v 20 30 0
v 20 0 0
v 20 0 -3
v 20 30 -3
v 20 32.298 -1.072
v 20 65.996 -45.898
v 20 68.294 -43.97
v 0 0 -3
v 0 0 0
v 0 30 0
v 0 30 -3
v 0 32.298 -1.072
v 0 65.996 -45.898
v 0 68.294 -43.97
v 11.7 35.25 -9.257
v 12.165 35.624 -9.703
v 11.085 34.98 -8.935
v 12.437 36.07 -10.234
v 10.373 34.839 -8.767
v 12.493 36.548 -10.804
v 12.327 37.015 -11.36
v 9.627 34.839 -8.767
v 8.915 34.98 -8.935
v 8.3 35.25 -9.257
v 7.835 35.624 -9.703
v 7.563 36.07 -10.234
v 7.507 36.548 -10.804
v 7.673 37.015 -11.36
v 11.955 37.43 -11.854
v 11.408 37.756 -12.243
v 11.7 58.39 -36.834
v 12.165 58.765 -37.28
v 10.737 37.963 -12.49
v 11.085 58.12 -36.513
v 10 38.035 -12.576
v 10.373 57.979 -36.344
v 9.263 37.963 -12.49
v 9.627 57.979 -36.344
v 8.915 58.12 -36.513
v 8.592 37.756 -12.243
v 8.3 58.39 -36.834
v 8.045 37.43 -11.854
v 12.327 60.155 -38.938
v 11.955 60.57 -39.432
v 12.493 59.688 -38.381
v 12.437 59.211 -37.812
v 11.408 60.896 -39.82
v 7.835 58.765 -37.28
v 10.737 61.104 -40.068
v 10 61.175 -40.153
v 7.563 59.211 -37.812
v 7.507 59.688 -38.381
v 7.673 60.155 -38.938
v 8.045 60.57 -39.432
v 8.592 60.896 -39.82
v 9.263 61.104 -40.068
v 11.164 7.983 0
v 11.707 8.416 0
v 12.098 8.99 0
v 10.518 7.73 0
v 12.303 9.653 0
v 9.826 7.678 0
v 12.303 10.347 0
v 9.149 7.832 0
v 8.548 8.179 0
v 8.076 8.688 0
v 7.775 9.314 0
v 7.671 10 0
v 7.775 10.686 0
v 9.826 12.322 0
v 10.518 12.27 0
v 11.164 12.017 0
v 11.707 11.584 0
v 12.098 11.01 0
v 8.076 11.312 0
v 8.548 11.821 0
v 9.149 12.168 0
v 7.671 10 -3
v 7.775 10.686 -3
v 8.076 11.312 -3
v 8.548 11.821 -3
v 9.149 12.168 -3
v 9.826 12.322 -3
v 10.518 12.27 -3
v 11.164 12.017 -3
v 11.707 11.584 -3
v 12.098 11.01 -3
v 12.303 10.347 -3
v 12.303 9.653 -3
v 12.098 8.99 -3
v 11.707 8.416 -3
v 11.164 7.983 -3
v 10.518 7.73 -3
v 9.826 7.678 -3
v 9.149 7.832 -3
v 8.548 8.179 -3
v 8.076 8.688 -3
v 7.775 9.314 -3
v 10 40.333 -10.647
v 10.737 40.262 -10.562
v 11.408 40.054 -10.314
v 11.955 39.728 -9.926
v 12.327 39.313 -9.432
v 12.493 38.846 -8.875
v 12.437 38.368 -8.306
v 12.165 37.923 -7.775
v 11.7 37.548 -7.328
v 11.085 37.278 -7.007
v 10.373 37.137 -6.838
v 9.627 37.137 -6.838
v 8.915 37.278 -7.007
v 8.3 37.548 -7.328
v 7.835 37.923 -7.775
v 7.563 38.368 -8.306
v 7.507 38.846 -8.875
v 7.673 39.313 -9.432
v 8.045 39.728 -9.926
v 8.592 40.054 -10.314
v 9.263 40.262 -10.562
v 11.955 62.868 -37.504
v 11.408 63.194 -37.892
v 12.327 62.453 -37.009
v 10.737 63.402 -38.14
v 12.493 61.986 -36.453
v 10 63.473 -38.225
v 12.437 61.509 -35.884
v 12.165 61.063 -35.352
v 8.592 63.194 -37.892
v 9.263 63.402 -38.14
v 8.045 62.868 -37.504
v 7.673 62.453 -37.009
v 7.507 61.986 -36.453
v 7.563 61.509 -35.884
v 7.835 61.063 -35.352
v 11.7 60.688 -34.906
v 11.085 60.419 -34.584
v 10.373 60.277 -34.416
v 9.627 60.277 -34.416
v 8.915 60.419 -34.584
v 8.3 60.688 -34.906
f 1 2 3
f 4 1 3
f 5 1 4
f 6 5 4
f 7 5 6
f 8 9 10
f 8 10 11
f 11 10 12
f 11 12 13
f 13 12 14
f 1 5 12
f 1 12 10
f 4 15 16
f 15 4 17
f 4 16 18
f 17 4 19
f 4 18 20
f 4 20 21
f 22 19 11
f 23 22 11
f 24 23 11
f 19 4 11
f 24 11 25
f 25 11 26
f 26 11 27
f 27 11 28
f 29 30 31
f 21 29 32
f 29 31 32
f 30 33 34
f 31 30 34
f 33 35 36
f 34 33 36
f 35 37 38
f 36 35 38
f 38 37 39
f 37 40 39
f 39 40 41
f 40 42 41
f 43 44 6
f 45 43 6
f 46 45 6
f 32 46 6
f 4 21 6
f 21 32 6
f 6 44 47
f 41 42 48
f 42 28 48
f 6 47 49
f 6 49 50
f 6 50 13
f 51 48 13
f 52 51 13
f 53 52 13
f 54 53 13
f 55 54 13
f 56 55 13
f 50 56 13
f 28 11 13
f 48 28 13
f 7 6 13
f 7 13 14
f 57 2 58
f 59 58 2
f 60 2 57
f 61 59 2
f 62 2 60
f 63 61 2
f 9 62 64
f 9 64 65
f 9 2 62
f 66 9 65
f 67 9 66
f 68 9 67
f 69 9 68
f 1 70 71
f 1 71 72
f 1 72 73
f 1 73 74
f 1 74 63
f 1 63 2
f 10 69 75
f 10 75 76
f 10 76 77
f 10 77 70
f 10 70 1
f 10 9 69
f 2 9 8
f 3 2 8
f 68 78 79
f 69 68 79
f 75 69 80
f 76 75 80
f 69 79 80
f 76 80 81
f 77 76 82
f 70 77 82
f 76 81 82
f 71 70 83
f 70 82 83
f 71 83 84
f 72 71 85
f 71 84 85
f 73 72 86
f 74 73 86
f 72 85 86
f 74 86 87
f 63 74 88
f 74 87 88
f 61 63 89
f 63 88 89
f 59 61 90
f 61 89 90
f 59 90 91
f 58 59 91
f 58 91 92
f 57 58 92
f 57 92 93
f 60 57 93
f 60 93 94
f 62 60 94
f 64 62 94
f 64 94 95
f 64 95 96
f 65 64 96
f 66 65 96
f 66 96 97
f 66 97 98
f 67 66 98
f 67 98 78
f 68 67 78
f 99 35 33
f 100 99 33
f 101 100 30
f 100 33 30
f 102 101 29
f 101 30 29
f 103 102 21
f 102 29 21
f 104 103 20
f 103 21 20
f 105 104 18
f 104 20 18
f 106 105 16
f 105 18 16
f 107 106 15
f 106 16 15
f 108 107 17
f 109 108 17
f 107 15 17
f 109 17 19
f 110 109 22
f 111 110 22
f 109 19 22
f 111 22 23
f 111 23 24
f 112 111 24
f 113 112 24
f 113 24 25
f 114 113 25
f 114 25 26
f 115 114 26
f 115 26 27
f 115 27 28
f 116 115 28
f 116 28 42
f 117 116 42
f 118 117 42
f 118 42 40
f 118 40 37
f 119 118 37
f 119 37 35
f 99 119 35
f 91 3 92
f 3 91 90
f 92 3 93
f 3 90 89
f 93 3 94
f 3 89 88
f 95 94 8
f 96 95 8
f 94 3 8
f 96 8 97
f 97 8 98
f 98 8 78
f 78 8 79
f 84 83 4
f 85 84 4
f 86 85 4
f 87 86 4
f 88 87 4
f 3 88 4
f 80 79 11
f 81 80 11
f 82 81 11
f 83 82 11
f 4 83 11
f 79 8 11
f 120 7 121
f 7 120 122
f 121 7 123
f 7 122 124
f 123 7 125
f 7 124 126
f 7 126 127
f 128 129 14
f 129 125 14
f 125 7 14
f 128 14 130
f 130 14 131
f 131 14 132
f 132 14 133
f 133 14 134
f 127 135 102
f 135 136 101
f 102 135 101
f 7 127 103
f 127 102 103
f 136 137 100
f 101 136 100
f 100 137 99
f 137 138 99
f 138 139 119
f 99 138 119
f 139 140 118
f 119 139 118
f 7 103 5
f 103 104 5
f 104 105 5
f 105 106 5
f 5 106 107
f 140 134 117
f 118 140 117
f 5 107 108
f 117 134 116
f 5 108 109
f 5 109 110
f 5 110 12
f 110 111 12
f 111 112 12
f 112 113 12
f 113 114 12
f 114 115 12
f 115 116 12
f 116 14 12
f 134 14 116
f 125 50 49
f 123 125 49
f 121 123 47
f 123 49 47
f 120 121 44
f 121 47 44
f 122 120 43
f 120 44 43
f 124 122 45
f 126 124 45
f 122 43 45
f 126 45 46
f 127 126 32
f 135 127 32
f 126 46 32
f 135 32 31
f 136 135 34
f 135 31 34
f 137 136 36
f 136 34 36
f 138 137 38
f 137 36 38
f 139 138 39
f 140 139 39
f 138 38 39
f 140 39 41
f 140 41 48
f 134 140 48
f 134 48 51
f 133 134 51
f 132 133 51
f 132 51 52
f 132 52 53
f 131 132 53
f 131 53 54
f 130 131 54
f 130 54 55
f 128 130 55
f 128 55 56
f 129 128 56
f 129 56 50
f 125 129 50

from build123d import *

# Parameters (mm, degrees)
EXTRUDE_1_DEPTH     = 20
CUT_EXTRUDE_1_REACH = 83.569
SKETCH_3_R          = 2.5
SKETCH_4_R          = 2.328749205
CUT_EXTRUDE_2_DEPTH = 100


with BuildPart() as part:
    # 草图2 → 凸台-拉伸1 (new body)
    with BuildSketch(Plane(origin=(0, 0, 0), x_dir=(0, 0, -1), z_dir=(1, 0, 0))):
        Polygon((1.071637171, 32.298133329), (0, 30), (0, 0), (3, 0), (3, 30), (45.898488815, 65.996106142), (43.970125986, 68.294239472), align=None)
    extrude(amount=EXTRUDE_1_DEPTH)

    # 草图3 → 切除-拉伸1 (cut, up to next)
    with BuildSketch(Plane(origin=(0, 16.127511035, 13.532588562), x_dir=(-1, 0, 0), z_dir=(0, -0.7660444431189622, -0.6427876096865582)), mode=Mode.PRIVATE) as cut_extrude_1_sk1:
        with Locations((-10, 67.58176162)):
            Circle(SKETCH_3_R)
    cut_extrude_1_tool1 = extrude(cut_extrude_1_sk1.sketch, amount=-CUT_EXTRUDE_1_REACH, mode=Mode.PRIVATE) & part.part
    # 草图3 → 切除-拉伸1 (cut, up to next)
    with BuildSketch(Plane(origin=(0, 16.127511035, 13.532588562), x_dir=(-1, 0, 0), z_dir=(0, -0.7660444431189622, -0.6427876096865582)), mode=Mode.PRIVATE) as cut_extrude_1_sk2:
        with Locations((-10, 31.58176162)):
            Circle(SKETCH_3_R)
    cut_extrude_1_tool2 = extrude(cut_extrude_1_sk2.sketch, amount=-CUT_EXTRUDE_1_REACH, mode=Mode.PRIVATE) & part.part
    add(cut_extrude_1_tool1.solids().sort_by_distance((10, 59.56823, -38.238044))[0], mode=Mode.SUBTRACT)
    add(cut_extrude_1_tool2.solids().sort_by_distance((10, 36.427876, -10.660444))[0], mode=Mode.SUBTRACT)

    # 草图4 → 切除-拉伸2 (cut)
    with BuildSketch(Plane(origin=(0, 0, -3), x_dir=(-1, 0, 0), z_dir=(0, 0, -1))):
        with Locations((-10, 10)):
            Circle(SKETCH_4_R)
    extrude(amount=-CUT_EXTRUDE_2_DEPTH, mode=Mode.SUBTRACT)


solid = part.part
